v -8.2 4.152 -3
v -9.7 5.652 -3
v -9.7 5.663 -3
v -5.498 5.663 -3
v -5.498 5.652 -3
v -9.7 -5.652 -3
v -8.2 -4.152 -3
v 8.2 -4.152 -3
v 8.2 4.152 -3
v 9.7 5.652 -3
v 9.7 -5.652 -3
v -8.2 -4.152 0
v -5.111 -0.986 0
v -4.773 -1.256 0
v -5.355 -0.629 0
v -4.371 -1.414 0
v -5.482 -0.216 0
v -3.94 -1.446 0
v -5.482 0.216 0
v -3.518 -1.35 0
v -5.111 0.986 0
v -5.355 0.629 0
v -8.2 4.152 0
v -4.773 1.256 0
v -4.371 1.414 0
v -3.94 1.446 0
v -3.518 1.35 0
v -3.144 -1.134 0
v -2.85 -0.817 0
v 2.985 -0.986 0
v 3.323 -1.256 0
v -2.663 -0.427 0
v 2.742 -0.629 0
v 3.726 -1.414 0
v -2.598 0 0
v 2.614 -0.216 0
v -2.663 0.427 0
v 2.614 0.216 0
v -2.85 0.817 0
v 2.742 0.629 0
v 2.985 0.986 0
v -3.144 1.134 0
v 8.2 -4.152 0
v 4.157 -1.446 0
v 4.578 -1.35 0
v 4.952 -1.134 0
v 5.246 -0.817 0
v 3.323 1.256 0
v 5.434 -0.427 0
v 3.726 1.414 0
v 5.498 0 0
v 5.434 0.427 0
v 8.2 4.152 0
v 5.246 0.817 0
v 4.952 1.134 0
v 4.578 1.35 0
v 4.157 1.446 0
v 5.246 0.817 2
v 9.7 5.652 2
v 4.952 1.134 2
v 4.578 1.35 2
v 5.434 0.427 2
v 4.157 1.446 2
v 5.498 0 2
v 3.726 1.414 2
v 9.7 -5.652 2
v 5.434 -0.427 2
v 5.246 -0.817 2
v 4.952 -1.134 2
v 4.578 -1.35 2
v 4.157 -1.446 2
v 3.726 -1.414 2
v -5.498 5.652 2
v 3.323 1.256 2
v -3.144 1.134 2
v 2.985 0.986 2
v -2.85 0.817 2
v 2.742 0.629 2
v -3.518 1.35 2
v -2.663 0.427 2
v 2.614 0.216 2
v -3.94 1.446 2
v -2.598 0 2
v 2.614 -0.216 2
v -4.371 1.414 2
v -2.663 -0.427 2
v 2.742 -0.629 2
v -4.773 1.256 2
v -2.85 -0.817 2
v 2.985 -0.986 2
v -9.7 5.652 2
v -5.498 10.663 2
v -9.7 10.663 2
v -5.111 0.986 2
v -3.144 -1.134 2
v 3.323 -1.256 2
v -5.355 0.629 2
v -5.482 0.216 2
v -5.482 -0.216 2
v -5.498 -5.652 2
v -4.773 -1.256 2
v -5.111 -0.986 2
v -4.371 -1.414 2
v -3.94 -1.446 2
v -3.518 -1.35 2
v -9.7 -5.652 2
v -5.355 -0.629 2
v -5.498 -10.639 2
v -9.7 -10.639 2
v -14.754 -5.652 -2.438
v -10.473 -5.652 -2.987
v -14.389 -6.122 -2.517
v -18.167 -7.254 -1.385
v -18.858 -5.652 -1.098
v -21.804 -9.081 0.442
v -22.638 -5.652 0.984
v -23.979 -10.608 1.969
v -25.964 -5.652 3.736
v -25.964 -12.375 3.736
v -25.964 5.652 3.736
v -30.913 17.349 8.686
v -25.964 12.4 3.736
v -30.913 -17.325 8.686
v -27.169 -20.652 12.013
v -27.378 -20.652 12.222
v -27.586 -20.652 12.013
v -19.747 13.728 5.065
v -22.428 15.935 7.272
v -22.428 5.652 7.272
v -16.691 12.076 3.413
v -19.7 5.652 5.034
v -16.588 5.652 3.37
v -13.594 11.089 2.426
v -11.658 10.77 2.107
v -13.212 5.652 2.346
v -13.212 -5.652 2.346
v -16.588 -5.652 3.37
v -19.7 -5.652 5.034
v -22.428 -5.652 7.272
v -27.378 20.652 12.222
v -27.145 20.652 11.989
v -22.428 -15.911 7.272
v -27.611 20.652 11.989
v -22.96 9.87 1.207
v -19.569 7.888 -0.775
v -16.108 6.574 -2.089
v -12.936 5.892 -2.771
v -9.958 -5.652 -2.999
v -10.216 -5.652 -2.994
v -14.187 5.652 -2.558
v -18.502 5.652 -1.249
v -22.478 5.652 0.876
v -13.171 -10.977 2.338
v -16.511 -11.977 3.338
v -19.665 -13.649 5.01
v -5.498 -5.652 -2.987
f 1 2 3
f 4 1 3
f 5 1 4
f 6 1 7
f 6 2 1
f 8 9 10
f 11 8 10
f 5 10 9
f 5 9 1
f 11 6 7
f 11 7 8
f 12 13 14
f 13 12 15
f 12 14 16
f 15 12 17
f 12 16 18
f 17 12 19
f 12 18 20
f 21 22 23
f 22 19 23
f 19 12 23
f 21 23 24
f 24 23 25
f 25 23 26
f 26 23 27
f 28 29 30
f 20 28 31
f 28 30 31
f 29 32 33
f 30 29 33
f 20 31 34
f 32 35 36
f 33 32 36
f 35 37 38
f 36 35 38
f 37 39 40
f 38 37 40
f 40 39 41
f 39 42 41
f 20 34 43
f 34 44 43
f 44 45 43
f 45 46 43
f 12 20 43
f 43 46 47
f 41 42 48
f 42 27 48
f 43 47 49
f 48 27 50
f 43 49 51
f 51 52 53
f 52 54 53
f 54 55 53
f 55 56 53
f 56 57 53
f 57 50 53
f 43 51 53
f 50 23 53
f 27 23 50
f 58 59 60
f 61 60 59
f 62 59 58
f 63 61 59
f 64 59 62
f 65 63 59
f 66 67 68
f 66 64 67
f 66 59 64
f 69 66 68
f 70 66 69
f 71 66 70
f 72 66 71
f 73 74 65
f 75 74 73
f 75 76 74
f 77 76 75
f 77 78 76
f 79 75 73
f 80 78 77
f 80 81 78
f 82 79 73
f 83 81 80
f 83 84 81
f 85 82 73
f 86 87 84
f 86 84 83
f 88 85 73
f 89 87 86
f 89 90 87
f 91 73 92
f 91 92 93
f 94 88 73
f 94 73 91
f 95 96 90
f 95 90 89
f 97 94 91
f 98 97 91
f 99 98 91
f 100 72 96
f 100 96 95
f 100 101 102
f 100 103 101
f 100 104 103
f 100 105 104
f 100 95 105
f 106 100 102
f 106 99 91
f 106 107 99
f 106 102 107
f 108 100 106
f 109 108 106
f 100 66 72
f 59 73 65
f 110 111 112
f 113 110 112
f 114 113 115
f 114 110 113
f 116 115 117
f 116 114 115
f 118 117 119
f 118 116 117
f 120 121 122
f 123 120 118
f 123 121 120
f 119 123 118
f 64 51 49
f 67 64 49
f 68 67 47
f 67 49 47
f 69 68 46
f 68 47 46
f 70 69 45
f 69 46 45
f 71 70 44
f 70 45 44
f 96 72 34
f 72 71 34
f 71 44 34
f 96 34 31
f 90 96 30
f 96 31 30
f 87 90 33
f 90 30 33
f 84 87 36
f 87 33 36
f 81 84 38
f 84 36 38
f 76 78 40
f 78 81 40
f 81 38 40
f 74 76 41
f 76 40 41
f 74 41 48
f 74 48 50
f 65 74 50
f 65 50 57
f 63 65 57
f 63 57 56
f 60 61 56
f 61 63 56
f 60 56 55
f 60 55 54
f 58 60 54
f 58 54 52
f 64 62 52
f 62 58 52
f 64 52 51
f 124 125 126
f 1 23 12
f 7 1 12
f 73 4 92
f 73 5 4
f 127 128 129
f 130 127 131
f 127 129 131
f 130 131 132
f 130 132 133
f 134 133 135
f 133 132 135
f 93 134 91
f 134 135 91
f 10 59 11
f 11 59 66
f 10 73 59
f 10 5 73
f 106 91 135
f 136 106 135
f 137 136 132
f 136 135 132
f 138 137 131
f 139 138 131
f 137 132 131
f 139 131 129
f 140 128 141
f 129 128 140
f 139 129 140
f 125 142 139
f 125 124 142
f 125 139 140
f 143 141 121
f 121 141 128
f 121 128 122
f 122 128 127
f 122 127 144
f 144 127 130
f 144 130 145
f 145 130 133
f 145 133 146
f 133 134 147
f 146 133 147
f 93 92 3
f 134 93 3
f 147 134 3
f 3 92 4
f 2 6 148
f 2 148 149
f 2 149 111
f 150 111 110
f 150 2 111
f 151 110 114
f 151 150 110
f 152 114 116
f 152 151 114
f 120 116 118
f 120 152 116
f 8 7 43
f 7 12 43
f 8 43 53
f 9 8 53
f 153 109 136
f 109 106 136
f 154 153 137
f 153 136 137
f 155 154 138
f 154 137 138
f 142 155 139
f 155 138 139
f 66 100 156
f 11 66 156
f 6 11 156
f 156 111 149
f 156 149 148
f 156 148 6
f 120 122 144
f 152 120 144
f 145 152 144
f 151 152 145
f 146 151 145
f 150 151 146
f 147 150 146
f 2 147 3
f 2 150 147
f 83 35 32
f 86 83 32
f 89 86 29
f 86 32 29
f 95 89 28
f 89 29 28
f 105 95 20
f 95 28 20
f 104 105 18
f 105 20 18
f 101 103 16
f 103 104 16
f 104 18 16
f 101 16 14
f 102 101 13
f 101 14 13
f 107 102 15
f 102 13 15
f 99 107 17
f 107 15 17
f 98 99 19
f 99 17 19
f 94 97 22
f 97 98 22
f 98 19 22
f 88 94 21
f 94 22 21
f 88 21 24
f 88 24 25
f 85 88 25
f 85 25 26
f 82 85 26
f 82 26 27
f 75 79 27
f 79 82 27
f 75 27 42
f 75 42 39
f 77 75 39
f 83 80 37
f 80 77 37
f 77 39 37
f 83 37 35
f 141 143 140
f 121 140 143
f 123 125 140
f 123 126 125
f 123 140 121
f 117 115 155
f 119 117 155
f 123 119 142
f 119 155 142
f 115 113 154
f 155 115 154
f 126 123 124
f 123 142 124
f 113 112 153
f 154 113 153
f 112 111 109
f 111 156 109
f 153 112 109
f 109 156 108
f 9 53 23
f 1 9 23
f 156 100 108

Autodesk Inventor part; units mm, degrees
ref_plane "YZ Plane" through (0, 0, 0) normal (1, 0, 0) x (0, 1, 0)
ref_plane "XZ Plane" through (0, 0, 0) normal (0, 1, 0) x (-1, 0, 0)
sketch "Sketch1" plane through (0, 0, 0) normal (0, 0, 1) x (1, 0, 0)
  circle A0 centre (-4.0482, 0) radius 1.45 projected
  circle A1 centre (4.0482, 0) radius 1.45 projected
  line L0 (-8, 3.9518) -> (-8, -3.9518) projected
  line L1 (-8, -3.9518) -> (8, -3.9518) projected
  line L2 (8, -3.9518) -> (8, 3.9518) projected
  line L3 (8, 3.9518) -> (-8, 3.9518) projected
  line L4 (8.2, 4.1518) -> (8.2, -4.1518)
  line L5 (8.2, -4.1518) -> (-8.2, -4.1518)
  line L6 (-8.2, -4.1518) -> (-8.2, 4.1518)
  line L7 (-8.2, 4.1518) -> (8.2, 4.1518)
  point P0 (0, 0)
  dimension "d0" = 0.2
extrude "Extrusion1" add sketch "Sketch1" along normal blind 2 contours L3 L2 L1 L0 | L4 L5 L6 L7
sketch "Sketch2" plane through (0, 0, 2) normal (0, 0, 1) x (1, 0, 0)
  line L0 (8.2, -4.1518) -> (8.2, 4.1518) projected
  line L1 (8.2, 4.1518) -> (-8.2, 4.1518) projected
  line L2 (-8.2, 4.1518) -> (-8.2, -4.1518) projected
  line L3 (-8.2, -4.1518) -> (8.2, -4.1518) projected
  line L4 (9.7, 5.6518) -> (9.7, -5.6518)
  line L5 (9.7, -5.6518) -> (-9.7, -5.6518)
  line L6 (-9.7, -5.6518) -> (-9.7, 5.6518)
  line L7 (-9.7, 5.6518) -> (9.7, 5.6518)
  point P0 (0, 0)
  dimension "d3" = 1.5
ref_plane "Work Plane1" through (7.9977, -5.9583, -3) normal (0, 0, 1) x (1, 0, 0)
extrude "Extrusion2" add sketch "Sketch2" against normal up to surface (5 mm away)
sketch "Sketch3" plane through (-9.7, 5.6518, 2) normal (0, 1, 0) x (1, 0, 0)
  line L0 (0, 0) -> (0, 5) projected
  line L1 (0, 0) -> (0, -18)
  circle A0 centre (0, -18) radius 18
  circle A1 centre (0, -18) radius 23
  line L2 (0, -18) -> (-16.2635, -1.7365)
  line L3 (0, -18) -> (23, -18) construction
  point P0 (9.7, 2)
  point P1 (-12.7279, -5.2721)
  dimension "d6" = 18
  dimension "d7" = 135
extrude "Extrusion3" add sketch "Sketch3" against normal up to surface (11.3036 mm away) contours A0 L2 A1 L0 picked at (-13.0139, -1.2154)
sketch "Sketch5" plane through (9.7, 5.6518, 2) normal (0, 1, 0) x (1, 0, 0)
  line L0 (-35.6635, -1.7365) -> (-32.1279, -5.2721) projected
  line L1 (-35.6635, -1.7365) -> (-32.1279, -5.2721)
  line L2 (-32.1279, -5.2721) -> (-37.0777, -10.2218)
  line L3 (-37.0777, -10.2218) -> (-40.6132, -6.6863)
  line L4 (-40.6132, -6.6863) -> (-35.6635, -1.7365)
  point P0 (-9.7, 2)
  dimension "d10" = 7
extrude "Extrusion4" add sketch "Sketch5" against normal up to surface (11.3036 mm away)
sketch "Sketch6" plane through (9.7, -5.6518, -3) normal (0, -1, 0) x (1, 0, 0)
  line L0 (-37.0777, 15.2218) -> (-32.1279, 10.2721) projected
  arc A0 (-32.1279, 10.2721) -> (-19.4, 5) centre (-19.4, 23) ccw projected
  line L1 (-40.6132, 11.6863) -> (-37.0777, 15.2218) projected
  line L2 (-35.6635, 6.7365) -> (-40.6132, 11.6863) projected
  arc A1 (-35.6635, 6.7365) -> (-19.4, 0) centre (-19.4, 23) ccw projected
  line L3 (-19.4, 5) -> (0, 5) projected
  line L4 (0, 0) -> (-19.4, 0) projected
  line L5 (-15.1982, 5) -> (-15.1982, 3) projected
  line L6 (-15.1982, 5) -> (-15.1982, 0)
  point P0 (-9.7, 3)
extrude "Extrusion5" add sketch "Sketch6" along normal blind 15
sketch "Sketch7" plane through (9.7, 5.6518, 2) normal (0, 1, 0) x (1, 0, 0)
  line L0 (-32.1279, -5.2721) -> (-37.0777, -10.2218) projected
  line L1 (-37.0777, -10.2218) -> (-40.6132, -6.6863) projected
  line L2 (-40.6132, -6.6863) -> (-35.6635, -1.7365) projected
  arc A0 (-19.4, 5) -> (-35.6635, -1.7365) centre (-19.4, -18) ccw projected
  line L3 (-19.4, 5) -> (-15.1982, 5) projected
  line L4 (-15.1982, 5) -> (-15.1982, 0) projected
  line L5 (-15.1982, 0) -> (-19.4, 0) projected
  arc A1 (-19.4, 0) -> (-32.1279, -5.2721) centre (-19.4, -18) ccw projected
  point P0 (-9.7, 2)
extrude "Extrusion6" add sketch "Sketch7" along normal blind 15
sketch "Sketch8" plane through (-5.4982, 5.6518, 2) normal (1, 0, 0) x (0, 0, -1)
  line L0 (-43.306, 51.1457) -> (8.0398, -0.2) projected
  line L1 (8.0154, -11.1036) -> (-43.306, -62.425) projected
  line L2 (-44.7202, 49.7315) -> (6.6255, -1.6142)
  line L3 (6.6012, -9.6894) -> (-44.7202, -61.0108)
  line L4 (5, 0) -> (5, 15) projected
  line L5 (-10.2218, 15) -> (-5.2721, 15) projected
  line L6 (-5.2721, 15) -> (0, 15) projected
  line L7 (0, 15) -> (5, 15) projected
  line L8 (5, -11.3036) -> (5, -26.3036) projected
  line L9 (5, -26.3036) -> (0, -26.3036) projected
  line L10 (0, -26.3036) -> (-5.2721, -26.3036) projected
  line L11 (-5.2721, -26.3036) -> (-10.2218, -26.3036) projected
  line L12 (0, -11.3036) -> (5, -11.3036) projected
  point P0 (2, -5.6518)
  point P1 (-9.9887, 15)
  point P2 (5, 0.0113)
  point P3 (4.987, -11.3036)
  point P4 (-10.013, -26.3036)
  dimension "d17" = 2
  dimension "d18" = 2
extrude "Extrusion7" cut sketch "Sketch8" against normal through all
properties part number "KickerFoot_3DPrint"
